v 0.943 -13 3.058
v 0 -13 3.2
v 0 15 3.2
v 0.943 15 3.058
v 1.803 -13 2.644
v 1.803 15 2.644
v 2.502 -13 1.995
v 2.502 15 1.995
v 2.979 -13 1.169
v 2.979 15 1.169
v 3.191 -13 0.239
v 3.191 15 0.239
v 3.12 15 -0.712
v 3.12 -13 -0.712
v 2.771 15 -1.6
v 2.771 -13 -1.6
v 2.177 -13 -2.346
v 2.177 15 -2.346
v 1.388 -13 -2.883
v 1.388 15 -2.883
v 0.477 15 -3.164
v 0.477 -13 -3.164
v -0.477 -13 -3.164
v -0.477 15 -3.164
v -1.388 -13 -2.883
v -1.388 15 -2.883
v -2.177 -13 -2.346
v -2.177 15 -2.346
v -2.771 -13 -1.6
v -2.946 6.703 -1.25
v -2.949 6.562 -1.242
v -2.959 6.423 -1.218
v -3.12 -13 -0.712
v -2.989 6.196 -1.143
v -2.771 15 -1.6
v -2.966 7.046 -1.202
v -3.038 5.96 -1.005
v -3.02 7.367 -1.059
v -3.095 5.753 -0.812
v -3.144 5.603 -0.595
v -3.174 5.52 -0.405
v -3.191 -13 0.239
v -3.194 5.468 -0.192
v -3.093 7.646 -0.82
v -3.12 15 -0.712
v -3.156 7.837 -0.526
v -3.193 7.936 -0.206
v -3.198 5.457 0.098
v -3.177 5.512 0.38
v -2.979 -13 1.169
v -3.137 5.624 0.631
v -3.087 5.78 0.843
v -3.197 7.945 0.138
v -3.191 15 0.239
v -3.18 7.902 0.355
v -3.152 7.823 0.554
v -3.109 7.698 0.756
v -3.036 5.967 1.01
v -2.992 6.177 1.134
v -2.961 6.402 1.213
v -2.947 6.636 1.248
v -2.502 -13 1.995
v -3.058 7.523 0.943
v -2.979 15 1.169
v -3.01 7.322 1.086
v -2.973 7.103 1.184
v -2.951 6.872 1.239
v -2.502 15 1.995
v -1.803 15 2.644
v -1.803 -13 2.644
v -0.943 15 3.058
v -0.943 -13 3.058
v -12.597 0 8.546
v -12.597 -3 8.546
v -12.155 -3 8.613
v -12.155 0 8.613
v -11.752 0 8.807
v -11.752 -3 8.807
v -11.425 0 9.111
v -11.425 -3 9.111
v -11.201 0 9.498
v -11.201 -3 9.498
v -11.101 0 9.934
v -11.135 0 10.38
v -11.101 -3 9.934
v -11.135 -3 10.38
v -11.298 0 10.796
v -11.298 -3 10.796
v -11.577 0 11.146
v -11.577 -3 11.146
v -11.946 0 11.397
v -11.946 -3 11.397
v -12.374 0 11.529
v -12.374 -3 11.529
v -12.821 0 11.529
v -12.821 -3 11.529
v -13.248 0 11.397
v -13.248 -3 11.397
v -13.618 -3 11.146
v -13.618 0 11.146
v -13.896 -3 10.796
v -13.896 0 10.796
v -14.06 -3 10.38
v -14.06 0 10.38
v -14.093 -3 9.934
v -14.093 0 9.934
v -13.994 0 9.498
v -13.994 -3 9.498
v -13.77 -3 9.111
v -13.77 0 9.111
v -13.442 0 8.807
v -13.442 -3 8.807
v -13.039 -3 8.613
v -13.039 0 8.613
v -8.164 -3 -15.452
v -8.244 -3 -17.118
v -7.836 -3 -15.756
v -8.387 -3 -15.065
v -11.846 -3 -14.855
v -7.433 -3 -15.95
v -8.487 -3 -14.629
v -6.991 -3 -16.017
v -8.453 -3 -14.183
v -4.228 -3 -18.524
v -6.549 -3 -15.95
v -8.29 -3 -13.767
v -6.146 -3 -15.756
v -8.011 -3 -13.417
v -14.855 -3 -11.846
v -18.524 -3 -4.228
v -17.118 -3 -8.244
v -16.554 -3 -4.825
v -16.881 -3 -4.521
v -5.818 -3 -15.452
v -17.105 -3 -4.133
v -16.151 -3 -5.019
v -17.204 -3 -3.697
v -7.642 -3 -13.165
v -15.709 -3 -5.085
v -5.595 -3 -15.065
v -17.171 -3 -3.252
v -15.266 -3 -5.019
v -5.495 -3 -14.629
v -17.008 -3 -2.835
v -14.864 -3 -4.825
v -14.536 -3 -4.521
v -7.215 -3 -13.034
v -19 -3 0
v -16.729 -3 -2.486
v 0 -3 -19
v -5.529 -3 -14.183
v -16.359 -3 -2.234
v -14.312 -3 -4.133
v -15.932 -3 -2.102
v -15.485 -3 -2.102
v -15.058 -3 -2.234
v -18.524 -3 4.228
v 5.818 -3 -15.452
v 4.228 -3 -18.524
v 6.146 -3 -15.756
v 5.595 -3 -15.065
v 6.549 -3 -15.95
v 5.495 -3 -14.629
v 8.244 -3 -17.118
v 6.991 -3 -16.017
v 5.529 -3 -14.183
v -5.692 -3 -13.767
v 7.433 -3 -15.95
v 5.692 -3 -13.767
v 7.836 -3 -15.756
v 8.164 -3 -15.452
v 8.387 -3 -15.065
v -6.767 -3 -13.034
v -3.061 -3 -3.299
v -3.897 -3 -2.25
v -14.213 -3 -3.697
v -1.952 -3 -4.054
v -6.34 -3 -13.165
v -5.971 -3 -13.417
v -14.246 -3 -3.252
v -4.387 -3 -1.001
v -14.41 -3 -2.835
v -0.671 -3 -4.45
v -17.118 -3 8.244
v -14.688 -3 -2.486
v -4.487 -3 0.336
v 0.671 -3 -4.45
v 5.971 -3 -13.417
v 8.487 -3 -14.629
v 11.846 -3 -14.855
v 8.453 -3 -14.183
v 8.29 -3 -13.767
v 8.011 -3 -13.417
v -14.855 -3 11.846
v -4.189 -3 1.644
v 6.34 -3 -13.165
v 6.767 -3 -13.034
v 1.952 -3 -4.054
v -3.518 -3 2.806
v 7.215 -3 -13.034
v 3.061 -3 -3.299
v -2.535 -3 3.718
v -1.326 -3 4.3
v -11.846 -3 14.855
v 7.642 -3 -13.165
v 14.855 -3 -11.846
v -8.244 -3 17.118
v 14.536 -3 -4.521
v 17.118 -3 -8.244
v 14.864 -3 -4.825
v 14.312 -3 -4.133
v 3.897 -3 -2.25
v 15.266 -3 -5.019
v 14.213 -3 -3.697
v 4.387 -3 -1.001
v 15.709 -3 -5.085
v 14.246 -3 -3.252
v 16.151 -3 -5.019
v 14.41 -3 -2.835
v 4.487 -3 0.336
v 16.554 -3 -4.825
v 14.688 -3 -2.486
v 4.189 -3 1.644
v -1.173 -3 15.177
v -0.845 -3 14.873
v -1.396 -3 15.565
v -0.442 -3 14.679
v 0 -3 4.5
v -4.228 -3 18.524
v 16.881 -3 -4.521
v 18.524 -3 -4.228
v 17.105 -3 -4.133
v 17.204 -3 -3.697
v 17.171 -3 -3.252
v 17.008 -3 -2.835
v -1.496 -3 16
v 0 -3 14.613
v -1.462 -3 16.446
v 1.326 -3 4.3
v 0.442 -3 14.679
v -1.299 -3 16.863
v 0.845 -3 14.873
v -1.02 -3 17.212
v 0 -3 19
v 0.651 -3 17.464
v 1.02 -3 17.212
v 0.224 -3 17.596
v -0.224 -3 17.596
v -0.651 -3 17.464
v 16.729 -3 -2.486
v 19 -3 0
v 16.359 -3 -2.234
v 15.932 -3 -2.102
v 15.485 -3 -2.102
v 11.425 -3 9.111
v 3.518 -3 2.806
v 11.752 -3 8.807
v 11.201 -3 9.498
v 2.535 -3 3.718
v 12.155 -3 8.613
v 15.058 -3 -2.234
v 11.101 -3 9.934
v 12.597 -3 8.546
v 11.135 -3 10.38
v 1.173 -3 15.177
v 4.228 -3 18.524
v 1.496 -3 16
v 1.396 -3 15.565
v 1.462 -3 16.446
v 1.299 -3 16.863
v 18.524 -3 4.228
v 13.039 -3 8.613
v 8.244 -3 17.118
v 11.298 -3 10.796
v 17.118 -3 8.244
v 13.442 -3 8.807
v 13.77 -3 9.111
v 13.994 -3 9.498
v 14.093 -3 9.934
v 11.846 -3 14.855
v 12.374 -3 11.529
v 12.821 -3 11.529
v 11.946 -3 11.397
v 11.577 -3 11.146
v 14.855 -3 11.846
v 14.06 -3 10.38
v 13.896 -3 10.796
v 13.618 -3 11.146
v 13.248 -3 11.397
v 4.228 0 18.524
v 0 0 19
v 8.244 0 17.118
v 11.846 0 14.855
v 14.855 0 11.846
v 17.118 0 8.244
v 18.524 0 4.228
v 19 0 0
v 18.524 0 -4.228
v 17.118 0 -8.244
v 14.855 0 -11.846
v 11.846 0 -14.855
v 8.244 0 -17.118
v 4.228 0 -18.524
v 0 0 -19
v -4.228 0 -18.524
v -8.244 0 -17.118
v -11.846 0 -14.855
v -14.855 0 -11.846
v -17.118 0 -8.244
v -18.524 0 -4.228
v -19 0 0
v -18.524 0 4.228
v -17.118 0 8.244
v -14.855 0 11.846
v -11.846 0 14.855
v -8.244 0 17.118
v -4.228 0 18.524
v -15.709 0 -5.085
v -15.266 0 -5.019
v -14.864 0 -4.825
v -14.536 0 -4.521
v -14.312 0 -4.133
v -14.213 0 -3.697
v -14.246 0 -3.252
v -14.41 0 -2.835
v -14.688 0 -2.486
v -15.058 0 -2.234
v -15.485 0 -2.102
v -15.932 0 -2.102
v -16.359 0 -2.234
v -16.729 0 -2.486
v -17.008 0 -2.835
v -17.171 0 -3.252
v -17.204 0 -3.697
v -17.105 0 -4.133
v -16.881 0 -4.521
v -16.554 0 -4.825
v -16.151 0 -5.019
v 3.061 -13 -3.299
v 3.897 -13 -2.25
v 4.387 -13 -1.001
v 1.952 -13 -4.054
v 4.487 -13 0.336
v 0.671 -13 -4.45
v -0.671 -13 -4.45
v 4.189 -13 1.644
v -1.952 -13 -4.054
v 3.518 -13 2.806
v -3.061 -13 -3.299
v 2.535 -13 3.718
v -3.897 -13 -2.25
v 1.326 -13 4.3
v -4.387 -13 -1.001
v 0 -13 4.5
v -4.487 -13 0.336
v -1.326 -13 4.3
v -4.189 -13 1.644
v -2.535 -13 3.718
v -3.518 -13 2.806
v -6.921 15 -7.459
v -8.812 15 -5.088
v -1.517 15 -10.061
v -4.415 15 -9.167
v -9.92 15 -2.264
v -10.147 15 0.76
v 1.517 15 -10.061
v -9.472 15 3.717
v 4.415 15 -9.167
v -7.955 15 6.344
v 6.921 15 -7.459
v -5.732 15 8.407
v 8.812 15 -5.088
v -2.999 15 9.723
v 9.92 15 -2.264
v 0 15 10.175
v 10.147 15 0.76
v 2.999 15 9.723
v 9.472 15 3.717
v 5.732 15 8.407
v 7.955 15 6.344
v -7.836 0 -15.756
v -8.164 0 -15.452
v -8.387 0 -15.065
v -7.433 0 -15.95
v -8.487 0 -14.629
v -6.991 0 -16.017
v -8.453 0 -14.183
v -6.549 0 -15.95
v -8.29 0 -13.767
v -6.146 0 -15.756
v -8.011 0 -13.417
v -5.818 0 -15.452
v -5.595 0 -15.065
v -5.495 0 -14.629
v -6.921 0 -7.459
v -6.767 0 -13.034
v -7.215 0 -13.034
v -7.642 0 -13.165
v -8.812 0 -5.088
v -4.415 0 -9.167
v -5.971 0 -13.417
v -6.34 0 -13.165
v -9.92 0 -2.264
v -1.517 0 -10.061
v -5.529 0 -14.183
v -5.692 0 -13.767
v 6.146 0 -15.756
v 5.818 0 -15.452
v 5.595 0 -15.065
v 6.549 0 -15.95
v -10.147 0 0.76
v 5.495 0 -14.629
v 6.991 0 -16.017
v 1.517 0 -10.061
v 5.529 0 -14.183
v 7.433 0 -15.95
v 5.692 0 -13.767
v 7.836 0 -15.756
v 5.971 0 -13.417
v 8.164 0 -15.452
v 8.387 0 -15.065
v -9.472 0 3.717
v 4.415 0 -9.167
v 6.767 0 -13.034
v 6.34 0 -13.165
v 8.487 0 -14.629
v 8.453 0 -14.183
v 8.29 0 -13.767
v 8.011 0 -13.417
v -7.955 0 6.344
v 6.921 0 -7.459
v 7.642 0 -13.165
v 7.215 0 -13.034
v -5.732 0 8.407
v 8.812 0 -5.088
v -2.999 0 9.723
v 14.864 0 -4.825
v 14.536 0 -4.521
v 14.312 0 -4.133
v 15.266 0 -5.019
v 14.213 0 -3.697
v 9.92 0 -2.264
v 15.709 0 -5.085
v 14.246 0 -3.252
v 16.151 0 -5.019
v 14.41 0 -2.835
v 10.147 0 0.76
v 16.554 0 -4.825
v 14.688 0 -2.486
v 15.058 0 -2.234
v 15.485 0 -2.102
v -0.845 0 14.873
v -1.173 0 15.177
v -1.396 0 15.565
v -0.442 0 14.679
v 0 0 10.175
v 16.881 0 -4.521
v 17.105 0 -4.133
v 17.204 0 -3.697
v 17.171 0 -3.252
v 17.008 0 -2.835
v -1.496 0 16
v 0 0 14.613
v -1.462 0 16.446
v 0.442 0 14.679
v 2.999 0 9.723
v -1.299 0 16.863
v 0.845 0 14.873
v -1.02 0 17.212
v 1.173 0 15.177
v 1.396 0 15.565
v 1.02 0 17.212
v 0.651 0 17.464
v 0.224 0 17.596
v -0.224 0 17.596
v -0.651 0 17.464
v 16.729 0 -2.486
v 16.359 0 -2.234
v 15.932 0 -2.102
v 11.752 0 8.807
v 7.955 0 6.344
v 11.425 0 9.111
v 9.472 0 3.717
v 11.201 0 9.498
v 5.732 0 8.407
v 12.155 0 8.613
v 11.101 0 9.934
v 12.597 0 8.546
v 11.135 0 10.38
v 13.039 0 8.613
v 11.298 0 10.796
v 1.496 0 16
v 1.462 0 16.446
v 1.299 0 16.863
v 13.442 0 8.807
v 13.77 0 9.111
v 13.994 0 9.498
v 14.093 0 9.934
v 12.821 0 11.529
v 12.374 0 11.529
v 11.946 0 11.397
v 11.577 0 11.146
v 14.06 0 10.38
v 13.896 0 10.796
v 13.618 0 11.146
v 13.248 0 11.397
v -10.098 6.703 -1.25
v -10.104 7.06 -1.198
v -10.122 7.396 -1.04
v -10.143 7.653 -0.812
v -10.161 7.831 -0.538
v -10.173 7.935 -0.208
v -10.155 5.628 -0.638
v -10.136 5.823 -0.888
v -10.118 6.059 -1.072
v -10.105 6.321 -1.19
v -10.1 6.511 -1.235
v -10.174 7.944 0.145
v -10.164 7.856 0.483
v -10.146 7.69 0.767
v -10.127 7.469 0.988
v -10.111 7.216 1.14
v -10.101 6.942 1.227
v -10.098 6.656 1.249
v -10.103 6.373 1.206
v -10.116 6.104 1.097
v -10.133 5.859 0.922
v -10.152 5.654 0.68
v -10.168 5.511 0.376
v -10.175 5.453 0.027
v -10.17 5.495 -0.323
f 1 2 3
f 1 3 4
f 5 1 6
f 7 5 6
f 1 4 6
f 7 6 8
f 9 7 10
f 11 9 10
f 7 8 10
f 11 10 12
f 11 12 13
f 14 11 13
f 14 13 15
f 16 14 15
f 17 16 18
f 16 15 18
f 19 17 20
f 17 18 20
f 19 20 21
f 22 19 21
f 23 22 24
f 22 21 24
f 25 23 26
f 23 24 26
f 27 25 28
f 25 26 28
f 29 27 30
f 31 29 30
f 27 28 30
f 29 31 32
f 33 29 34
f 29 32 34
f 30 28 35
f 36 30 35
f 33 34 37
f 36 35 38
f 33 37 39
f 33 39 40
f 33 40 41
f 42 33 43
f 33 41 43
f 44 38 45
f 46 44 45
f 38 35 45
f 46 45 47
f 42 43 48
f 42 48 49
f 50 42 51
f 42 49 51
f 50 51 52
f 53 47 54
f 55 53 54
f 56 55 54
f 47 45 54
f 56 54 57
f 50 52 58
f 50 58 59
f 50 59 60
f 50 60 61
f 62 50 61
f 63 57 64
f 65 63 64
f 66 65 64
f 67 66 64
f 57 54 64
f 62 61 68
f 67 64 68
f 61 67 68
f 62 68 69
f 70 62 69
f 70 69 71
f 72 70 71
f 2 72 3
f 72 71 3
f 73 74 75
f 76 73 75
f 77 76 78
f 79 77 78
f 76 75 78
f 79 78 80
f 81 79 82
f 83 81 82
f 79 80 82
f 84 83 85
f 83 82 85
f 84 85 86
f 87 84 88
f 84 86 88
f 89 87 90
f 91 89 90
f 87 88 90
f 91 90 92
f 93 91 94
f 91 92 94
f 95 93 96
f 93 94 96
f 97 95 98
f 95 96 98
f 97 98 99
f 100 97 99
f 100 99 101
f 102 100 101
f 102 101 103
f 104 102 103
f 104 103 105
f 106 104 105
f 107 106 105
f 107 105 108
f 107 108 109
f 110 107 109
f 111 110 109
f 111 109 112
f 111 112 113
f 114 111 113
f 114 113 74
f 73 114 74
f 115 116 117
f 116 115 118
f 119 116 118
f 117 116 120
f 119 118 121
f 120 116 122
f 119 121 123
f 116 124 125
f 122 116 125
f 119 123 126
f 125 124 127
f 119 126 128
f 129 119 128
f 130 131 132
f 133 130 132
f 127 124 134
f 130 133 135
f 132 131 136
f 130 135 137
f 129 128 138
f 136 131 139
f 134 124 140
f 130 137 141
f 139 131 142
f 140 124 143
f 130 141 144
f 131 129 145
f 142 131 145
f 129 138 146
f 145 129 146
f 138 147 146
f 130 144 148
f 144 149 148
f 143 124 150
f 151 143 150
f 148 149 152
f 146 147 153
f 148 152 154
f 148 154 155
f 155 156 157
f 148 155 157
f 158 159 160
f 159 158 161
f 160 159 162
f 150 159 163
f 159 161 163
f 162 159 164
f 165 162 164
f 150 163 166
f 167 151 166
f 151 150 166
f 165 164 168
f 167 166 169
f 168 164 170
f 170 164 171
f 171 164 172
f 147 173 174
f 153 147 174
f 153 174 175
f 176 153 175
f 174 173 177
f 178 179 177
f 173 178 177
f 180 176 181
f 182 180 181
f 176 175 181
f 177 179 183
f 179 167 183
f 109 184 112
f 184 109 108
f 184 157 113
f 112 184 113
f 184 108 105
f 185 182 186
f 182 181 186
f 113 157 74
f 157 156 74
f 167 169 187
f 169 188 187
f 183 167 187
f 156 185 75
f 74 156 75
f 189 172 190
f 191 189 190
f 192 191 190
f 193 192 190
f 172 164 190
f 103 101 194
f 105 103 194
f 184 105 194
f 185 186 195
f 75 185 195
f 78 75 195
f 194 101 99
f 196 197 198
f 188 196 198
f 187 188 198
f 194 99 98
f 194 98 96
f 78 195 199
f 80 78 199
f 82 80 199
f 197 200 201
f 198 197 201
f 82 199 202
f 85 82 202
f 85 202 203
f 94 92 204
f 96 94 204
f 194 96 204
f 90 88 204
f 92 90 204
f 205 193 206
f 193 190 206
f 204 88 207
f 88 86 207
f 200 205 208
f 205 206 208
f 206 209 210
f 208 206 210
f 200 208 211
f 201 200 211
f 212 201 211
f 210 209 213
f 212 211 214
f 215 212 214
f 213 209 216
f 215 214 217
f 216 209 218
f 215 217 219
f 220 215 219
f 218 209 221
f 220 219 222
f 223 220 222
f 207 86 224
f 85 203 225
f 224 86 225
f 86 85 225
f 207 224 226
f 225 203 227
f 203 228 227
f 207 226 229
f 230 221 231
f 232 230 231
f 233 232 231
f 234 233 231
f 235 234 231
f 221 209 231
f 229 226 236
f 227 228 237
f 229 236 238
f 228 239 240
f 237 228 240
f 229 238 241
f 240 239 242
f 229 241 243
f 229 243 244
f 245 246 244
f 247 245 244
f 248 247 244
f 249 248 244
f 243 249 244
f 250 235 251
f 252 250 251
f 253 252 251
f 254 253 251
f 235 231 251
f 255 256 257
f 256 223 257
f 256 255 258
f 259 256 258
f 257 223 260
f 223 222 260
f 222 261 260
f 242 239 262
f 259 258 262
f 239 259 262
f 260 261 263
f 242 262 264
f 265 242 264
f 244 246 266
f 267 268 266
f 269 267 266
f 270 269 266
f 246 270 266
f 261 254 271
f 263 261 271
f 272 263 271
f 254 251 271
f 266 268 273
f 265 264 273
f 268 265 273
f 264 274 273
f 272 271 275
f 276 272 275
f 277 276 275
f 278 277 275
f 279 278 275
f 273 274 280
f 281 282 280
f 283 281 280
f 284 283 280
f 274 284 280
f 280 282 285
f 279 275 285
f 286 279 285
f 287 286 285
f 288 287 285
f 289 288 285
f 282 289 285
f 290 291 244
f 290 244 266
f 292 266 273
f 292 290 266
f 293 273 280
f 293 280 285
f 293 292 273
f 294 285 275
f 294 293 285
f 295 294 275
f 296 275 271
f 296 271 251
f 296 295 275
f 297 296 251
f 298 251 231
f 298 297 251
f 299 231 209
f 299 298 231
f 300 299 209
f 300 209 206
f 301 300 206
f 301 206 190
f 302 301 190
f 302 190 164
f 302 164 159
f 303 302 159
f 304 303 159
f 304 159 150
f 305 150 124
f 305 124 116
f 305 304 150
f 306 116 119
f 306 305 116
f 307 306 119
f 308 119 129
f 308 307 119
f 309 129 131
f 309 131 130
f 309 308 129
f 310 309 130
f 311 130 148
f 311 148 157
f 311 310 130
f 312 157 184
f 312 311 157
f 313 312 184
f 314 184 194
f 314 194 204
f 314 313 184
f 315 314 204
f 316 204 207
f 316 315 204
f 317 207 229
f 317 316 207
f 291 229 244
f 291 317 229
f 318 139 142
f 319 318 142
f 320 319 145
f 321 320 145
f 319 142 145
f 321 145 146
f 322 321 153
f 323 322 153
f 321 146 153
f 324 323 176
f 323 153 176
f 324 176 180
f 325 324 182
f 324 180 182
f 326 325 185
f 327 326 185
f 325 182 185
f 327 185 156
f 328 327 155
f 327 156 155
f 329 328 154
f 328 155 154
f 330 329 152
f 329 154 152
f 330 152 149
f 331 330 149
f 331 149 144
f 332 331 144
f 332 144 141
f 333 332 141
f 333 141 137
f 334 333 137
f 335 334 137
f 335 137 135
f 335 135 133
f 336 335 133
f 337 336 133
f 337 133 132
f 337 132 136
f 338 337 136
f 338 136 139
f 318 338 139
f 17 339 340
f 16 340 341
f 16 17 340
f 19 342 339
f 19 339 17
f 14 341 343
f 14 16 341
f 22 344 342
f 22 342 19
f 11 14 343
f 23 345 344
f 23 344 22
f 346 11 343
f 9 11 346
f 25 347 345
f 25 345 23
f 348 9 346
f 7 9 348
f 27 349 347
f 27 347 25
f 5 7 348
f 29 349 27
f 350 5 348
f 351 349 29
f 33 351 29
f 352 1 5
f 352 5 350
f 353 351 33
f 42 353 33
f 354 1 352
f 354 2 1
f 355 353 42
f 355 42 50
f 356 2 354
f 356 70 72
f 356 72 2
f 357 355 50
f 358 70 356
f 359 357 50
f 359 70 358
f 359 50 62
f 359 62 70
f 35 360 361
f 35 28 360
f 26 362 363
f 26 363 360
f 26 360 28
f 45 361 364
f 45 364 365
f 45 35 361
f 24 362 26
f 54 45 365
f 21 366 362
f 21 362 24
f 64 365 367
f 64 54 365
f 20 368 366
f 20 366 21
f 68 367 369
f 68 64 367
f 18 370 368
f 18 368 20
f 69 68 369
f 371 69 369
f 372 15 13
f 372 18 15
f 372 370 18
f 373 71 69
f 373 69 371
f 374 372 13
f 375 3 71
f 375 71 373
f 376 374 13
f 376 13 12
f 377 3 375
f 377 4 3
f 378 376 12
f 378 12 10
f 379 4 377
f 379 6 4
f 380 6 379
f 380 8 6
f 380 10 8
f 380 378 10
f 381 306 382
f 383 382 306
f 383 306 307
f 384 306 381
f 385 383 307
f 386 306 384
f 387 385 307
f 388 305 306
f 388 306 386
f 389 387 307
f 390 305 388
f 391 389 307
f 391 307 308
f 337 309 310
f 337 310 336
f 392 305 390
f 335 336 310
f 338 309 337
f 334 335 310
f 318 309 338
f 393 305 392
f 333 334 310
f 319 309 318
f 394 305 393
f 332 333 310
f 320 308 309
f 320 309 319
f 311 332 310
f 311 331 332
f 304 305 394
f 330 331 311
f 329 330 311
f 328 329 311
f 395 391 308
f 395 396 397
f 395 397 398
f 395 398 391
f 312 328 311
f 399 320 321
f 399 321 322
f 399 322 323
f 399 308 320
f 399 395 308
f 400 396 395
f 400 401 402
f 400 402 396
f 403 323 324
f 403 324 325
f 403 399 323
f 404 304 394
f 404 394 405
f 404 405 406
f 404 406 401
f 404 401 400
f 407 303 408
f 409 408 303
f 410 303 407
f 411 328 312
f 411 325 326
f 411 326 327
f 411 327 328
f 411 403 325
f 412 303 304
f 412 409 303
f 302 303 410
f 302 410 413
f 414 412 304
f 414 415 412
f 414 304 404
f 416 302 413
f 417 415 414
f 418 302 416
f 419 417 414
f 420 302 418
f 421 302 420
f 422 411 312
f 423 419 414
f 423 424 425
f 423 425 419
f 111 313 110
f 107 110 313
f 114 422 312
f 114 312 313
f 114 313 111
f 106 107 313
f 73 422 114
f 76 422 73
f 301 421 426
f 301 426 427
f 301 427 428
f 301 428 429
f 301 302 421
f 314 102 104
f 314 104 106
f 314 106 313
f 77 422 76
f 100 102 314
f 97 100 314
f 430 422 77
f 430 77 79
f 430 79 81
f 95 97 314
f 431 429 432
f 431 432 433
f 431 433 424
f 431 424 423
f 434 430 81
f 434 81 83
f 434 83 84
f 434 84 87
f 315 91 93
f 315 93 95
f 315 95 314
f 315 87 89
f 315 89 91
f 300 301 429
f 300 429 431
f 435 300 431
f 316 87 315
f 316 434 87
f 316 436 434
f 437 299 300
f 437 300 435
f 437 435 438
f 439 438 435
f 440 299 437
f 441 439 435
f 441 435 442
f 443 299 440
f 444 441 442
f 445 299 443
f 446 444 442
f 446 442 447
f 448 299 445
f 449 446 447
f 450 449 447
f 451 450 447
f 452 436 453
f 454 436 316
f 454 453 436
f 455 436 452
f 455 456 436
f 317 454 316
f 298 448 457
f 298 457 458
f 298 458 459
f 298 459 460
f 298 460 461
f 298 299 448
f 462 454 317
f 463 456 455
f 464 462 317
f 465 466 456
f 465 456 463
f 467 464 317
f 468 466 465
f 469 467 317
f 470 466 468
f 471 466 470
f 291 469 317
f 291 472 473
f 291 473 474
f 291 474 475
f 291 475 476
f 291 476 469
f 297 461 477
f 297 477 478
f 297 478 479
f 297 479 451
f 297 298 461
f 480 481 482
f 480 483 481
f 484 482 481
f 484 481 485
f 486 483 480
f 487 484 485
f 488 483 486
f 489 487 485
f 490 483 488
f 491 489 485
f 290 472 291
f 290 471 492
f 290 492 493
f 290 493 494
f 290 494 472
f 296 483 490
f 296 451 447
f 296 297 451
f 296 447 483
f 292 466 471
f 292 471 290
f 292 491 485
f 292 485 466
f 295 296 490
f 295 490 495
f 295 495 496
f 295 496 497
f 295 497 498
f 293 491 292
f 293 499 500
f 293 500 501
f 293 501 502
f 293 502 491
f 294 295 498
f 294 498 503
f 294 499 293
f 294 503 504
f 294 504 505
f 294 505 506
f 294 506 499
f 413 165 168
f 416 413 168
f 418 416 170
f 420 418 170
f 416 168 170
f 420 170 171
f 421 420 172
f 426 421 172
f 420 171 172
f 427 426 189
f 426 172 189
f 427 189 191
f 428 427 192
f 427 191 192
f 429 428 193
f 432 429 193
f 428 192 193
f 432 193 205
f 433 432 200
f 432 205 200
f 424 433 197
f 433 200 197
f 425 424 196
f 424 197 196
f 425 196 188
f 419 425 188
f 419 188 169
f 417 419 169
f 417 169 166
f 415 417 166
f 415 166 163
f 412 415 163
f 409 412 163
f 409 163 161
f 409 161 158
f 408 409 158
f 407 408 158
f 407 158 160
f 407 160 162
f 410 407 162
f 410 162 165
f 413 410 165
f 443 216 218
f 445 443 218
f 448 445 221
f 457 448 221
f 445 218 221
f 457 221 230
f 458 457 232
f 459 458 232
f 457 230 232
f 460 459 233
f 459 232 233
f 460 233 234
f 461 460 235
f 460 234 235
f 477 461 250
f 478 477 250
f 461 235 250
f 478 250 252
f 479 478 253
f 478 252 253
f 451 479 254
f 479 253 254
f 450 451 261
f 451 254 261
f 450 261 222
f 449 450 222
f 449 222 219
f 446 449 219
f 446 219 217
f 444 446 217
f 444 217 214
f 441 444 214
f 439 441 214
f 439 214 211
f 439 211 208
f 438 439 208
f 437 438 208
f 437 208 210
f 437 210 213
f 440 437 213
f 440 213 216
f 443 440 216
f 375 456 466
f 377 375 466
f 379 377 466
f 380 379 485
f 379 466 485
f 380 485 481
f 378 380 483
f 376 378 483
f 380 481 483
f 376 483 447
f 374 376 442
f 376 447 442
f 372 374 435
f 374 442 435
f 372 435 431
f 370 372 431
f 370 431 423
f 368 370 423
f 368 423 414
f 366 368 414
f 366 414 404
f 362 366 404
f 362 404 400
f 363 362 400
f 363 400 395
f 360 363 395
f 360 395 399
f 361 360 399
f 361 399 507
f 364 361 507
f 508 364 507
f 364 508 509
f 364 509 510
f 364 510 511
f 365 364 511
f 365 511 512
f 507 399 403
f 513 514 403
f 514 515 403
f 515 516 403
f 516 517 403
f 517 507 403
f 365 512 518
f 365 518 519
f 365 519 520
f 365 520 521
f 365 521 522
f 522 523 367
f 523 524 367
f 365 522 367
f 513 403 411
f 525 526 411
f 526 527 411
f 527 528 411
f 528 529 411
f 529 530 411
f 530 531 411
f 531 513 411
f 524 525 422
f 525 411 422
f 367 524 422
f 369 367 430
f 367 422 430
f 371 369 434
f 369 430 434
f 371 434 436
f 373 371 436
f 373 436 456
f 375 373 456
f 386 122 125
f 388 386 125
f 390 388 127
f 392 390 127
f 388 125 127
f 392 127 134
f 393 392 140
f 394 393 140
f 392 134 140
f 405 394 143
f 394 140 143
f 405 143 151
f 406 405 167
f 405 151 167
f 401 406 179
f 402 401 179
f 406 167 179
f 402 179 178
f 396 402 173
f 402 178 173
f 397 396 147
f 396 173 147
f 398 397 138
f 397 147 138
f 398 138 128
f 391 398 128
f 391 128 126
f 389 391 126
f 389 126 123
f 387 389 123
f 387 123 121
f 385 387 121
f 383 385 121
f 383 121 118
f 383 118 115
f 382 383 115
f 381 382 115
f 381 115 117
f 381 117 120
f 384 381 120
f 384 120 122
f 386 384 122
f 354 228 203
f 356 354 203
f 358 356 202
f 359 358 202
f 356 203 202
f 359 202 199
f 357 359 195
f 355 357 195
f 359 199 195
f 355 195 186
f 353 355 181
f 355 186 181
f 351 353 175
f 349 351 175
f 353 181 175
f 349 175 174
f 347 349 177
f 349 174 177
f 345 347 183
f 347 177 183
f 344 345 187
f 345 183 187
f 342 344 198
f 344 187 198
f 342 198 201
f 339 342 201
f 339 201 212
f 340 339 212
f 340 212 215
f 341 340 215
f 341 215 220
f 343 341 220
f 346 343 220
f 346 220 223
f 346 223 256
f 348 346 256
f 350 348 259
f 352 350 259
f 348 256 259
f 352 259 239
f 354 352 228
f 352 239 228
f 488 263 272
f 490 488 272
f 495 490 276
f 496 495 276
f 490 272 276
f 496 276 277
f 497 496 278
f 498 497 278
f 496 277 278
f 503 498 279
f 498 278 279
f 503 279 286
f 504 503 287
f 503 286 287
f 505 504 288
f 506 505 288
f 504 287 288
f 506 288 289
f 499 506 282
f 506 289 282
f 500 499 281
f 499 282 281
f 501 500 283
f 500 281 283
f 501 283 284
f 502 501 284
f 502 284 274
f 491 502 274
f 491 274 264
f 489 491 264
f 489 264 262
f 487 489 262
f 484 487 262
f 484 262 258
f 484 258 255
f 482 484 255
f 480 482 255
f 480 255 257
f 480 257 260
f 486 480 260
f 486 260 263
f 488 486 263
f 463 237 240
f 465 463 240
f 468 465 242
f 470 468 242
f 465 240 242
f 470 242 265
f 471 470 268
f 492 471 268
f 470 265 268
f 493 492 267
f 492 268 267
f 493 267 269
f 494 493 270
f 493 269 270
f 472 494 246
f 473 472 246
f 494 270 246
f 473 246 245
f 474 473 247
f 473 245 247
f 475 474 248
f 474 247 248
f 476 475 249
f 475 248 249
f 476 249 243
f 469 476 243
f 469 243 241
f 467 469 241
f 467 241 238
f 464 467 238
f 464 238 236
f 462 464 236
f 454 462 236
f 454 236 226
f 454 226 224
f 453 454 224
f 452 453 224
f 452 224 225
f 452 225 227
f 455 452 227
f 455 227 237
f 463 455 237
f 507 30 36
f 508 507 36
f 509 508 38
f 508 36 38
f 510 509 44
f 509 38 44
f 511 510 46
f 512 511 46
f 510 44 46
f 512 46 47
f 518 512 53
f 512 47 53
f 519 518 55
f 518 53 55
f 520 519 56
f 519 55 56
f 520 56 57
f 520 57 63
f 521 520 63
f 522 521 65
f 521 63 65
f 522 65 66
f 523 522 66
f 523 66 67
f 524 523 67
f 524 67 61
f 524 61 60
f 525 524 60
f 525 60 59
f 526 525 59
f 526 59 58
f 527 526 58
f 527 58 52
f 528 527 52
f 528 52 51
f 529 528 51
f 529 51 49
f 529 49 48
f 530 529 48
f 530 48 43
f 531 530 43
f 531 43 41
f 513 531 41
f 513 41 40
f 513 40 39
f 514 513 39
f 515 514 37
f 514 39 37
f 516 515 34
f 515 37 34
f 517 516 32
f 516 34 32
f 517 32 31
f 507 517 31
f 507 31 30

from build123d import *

# Parameters (mm, degrees)
BOSS_EXTRUDE1_DEPTH      = 15
BOSS_EXTRUDE1_DEPTH_BACK = 3
SKETCH1_R                = 10.175
SKETCH1_R_2              = 3.2
SKETCH1_3_R              = 19
SKETCH1_3_R_2            = 10.175
BOSS_EXTRUDE2_DEPTH      = 3
SKETCH2_R                = 1.25
CUT_EXTRUDE1_DEPTH       = 15
SKETCH4_R                = 4.5
BOSS_EXTRUDE3_DEPTH      = 10
SKETCH1_7_R              = 3.2
CUT_EXTRUDE2_DEPTH       = 13
SKETCH3_R                = 1.5
CUT_EXTRUDE3_DEPTH       = 10


with BuildPart() as part:
    # Sketch1 → Boss-Extrude1 (new, two sides: drawn at the far end of the back side and taken through both)
    with BuildSketch(Plane(origin=(0, 0, 0), x_dir=(1, 0, 0), z_dir=(0, 1, 0)).offset(-BOSS_EXTRUDE1_DEPTH_BACK)):
        Circle(SKETCH1_R)
        Circle(SKETCH1_R_2, mode=Mode.SUBTRACT)
    extrude(amount=BOSS_EXTRUDE1_DEPTH + BOSS_EXTRUDE1_DEPTH_BACK)

    # Sketch2 → Cut-Extrude1 (cut)
    with BuildSketch(Plane(origin=(0, 0, 0), x_dir=(0, 0, -1), z_dir=(1, 0, 0))):
        with Locations((0, 6.702870317)):
            Circle(SKETCH2_R)
    extrude(amount=-CUT_EXTRUDE1_DEPTH, mode=Mode.SUBTRACT)


with BuildPart() as body_2:
    # Sketch1<3> → Boss-Extrude2 (new body)
    with BuildSketch(Plane(origin=(0, 0, 0), x_dir=(1, 0, 0), z_dir=(0, 1, 0))):
        Circle(SKETCH1_3_R)
        Circle(SKETCH1_3_R_2, mode=Mode.SUBTRACT)
    extrude(amount=-BOSS_EXTRUDE2_DEPTH)


    add(part.part)  # Boss-Extrude3 merges part
    # Sketch4 → Boss-Extrude3 (add)
    with BuildSketch(Plane.XZ.offset(3)):
        Circle(SKETCH4_R)
    extrude(amount=BOSS_EXTRUDE3_DEPTH)

    # Sketch1<7> → Cut-Extrude2 (cut)
    with BuildSketch(Plane(origin=(0, 0, 0), x_dir=(1, 0, 0), z_dir=(0, 1, 0))):
        Circle(SKETCH1_7_R)
    extrude(amount=-CUT_EXTRUDE2_DEPTH, mode=Mode.SUBTRACT)

    # Sketch3 → Cut-Extrude3 (cut)
    with BuildSketch(Plane.XZ.offset(3)):
        with Locations((0, 16.112537947)):
            Circle(SKETCH3_R)
        with Locations((12.597289429, 10.046003092)):
            Circle(SKETCH3_R)
        with Locations((15.70856298, -3.585376992)):
            Circle(SKETCH3_R)
        with Locations((6.990968211, -14.516895073)):
            Circle(SKETCH3_R)
        with Locations((-6.990968211, -14.516895073)):
            Circle(SKETCH3_R)
        with Locations((-15.70856298, -3.585376992)):
            Circle(SKETCH3_R)
        with Locations((-12.597289429, 10.046003092)):
            Circle(SKETCH3_R)
    extrude(amount=-CUT_EXTRUDE3_DEPTH, mode=Mode.SUBTRACT)


solid = body_2.part
